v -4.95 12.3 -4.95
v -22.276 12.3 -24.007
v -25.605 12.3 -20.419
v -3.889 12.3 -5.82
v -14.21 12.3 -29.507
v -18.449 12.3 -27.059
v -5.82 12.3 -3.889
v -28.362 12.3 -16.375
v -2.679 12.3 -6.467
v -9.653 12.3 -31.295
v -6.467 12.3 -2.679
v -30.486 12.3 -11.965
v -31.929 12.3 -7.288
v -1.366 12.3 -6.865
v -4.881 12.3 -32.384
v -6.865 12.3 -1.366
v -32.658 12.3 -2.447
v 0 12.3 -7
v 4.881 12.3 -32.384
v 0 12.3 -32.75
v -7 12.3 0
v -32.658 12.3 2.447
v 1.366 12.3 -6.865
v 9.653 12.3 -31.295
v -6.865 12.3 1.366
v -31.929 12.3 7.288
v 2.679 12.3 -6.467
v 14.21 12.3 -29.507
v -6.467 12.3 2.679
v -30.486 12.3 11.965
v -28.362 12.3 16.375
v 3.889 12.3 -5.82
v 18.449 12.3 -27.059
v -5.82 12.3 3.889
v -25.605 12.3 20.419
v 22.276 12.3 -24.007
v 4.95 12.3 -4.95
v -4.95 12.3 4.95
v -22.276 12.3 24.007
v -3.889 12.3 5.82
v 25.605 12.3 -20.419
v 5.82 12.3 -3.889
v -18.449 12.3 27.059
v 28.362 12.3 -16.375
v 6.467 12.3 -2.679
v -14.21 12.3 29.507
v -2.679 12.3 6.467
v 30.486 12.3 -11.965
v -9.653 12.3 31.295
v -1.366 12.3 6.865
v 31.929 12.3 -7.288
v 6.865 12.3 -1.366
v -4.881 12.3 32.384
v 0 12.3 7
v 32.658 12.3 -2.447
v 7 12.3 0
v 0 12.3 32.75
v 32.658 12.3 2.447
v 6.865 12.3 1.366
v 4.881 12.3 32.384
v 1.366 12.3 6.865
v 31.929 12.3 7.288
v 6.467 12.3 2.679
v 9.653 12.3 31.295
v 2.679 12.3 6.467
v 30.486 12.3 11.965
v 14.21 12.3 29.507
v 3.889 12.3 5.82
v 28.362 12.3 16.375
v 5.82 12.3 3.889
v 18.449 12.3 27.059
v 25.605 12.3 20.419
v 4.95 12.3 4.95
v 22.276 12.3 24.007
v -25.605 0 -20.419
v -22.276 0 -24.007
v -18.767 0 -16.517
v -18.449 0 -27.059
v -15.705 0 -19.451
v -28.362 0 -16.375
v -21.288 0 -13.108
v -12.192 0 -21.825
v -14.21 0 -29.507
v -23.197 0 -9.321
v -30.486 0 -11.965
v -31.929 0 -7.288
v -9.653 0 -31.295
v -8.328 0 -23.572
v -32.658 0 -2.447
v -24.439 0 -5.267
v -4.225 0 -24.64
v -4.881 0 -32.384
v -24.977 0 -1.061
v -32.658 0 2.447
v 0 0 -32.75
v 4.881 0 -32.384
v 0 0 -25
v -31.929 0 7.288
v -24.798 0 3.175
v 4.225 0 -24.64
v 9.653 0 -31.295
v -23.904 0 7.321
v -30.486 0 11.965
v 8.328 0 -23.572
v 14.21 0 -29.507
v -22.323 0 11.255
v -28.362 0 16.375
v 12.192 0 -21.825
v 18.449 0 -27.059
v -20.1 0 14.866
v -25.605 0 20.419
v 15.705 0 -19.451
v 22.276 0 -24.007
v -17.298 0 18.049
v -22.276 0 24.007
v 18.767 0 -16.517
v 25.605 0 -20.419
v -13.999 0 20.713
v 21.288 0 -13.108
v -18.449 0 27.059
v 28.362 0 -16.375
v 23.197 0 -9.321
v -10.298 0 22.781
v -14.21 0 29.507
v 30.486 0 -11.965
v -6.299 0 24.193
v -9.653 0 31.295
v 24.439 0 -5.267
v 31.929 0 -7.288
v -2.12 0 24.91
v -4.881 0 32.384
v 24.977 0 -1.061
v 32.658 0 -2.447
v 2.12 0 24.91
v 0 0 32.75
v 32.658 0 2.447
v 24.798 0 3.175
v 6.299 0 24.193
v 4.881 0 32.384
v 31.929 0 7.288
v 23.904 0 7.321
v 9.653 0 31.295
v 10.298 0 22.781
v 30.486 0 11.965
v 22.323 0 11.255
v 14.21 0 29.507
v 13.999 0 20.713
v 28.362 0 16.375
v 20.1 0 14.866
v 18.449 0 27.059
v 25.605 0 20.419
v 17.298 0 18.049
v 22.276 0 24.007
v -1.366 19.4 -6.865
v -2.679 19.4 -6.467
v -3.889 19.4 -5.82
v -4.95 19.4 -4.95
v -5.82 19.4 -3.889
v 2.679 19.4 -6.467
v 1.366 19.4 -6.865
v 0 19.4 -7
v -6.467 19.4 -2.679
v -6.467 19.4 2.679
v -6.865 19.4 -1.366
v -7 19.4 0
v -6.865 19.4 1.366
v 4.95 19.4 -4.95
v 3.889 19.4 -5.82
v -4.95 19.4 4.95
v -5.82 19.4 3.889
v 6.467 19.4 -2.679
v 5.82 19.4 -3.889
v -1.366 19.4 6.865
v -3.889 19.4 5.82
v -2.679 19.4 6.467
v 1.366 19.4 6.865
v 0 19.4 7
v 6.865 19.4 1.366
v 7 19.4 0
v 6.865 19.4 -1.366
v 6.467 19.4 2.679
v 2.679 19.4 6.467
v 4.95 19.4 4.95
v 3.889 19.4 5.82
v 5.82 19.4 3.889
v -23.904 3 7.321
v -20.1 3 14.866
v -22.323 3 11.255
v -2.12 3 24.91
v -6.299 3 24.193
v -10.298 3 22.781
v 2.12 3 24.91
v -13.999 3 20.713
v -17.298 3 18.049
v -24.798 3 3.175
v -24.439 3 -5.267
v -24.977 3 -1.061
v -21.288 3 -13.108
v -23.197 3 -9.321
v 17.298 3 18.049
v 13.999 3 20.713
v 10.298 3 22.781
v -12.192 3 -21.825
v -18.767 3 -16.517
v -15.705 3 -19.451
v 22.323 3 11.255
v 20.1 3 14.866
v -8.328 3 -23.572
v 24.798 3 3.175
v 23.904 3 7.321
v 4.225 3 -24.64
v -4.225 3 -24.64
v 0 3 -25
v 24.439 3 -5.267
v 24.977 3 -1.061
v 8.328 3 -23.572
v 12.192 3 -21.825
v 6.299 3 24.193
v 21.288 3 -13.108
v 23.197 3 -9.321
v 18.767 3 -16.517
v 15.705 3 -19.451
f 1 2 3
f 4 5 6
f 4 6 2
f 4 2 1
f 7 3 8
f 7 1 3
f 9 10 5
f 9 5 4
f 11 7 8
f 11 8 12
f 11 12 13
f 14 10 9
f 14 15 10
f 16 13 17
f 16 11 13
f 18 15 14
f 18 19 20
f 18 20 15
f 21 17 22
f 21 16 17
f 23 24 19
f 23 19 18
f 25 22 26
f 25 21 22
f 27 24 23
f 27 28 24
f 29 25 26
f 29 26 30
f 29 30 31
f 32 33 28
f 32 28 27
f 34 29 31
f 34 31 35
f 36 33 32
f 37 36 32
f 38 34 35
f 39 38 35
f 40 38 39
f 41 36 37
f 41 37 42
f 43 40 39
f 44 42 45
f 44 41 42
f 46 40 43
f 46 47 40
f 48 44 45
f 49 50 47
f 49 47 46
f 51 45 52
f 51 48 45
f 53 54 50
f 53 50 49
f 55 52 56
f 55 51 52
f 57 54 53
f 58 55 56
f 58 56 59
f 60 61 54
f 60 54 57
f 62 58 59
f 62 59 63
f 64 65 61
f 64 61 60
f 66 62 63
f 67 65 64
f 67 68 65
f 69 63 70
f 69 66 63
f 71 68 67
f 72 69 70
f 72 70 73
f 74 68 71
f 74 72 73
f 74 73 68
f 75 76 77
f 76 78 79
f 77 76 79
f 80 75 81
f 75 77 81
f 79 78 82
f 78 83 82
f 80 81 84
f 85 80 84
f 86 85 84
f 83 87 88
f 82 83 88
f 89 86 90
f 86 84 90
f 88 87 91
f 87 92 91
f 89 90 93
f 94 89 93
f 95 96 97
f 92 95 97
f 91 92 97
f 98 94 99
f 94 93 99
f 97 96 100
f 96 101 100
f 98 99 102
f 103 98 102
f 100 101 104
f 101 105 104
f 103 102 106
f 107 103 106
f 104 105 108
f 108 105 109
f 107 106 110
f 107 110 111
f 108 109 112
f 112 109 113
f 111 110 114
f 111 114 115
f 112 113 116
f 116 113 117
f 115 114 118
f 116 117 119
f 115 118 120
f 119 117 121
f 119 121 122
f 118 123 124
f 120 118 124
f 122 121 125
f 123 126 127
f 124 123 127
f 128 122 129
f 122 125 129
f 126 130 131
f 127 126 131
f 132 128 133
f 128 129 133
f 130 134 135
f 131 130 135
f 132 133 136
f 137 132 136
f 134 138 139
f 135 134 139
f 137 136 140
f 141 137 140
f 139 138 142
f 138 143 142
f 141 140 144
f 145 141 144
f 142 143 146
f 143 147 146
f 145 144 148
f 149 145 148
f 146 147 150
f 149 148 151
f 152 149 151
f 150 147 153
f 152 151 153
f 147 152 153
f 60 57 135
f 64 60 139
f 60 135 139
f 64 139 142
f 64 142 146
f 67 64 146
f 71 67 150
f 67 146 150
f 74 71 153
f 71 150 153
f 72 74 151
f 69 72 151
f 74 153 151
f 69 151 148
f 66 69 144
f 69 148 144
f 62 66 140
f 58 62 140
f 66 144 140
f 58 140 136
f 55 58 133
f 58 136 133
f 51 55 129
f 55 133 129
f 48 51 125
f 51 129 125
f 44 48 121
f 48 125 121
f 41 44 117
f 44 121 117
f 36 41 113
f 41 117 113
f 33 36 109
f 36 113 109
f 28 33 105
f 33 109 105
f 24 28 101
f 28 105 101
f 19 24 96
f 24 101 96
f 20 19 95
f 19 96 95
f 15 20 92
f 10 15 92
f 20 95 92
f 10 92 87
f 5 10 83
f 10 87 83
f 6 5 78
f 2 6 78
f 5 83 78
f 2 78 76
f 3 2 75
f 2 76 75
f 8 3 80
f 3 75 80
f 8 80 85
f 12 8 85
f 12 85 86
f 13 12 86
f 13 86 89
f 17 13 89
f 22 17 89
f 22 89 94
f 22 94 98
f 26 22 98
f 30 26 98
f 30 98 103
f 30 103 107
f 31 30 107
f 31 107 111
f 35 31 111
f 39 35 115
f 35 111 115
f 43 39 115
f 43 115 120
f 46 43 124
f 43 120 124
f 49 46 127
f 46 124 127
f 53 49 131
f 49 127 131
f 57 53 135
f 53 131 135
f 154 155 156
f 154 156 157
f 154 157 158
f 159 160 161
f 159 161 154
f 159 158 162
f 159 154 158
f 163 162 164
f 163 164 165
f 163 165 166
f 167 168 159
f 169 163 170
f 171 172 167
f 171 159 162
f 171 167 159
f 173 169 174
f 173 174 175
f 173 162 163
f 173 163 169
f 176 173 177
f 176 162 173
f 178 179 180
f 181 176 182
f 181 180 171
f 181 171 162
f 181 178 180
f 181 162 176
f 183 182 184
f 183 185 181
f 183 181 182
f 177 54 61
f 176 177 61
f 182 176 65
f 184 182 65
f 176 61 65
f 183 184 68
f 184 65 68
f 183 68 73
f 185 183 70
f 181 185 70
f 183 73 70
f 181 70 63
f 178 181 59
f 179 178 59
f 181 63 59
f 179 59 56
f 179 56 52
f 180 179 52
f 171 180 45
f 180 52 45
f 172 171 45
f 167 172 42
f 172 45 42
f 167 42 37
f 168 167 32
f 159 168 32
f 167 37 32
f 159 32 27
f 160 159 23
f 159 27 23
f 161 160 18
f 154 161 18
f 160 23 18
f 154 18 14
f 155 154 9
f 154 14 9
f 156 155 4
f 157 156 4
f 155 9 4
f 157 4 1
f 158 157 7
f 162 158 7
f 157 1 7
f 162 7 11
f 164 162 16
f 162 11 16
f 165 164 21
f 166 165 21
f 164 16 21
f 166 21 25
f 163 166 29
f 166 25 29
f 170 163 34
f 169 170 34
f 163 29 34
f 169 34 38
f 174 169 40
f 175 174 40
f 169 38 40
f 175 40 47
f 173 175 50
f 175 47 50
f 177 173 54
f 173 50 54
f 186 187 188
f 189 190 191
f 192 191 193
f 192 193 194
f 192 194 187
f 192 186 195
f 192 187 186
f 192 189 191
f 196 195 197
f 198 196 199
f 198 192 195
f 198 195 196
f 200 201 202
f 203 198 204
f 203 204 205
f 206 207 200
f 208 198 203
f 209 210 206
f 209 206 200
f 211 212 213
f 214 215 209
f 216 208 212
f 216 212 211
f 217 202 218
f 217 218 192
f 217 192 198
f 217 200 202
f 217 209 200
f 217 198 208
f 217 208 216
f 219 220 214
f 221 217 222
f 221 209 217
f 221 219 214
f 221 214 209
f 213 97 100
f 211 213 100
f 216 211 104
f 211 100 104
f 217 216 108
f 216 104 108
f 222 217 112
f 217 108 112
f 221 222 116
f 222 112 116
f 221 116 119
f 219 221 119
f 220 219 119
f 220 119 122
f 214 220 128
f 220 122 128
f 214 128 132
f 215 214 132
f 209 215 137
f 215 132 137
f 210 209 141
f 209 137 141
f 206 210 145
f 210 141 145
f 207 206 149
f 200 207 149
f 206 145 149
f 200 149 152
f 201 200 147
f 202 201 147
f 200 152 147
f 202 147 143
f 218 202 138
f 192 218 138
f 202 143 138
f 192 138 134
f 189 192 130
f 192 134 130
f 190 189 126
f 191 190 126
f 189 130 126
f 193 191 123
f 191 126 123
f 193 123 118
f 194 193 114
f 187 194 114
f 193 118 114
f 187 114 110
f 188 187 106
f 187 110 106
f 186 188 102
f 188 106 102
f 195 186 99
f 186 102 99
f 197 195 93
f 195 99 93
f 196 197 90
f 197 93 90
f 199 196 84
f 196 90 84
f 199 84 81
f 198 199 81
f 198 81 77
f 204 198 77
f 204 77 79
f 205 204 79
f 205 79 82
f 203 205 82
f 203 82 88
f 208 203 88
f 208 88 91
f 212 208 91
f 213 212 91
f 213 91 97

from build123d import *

# Parameters (mm, degrees)
SKETCH1_R           = 32.75
BOSS_EXTRUDE1_DEPTH = 12.3
SKETCH2_R           = 7
BOSS_EXTRUDE2_DEPTH = 7.1
SKETCH4_R           = 25
CUT_EXTRUDE1_DEPTH  = 3


with BuildPart() as part:
    # Sketch1 → Boss-Extrude1 (new body)
    with BuildSketch(Plane(origin=(0, 0, 0), x_dir=(1, 0, 0), z_dir=(0, 1, 0))):
        with Locations(Location((0, 0, 0), (0, 0, 270))):
            Circle(SKETCH1_R)
    extrude(amount=BOSS_EXTRUDE1_DEPTH)

    # Sketch2 → Boss-Extrude2 (add)
    with BuildSketch(Plane(origin=(0, 12.3, 0), x_dir=(1, 0, 0), z_dir=(0, 1, 0))):
        with Locations(Location((0, 0, 0), (0, 0, 270))):
            Circle(SKETCH2_R)
    extrude(amount=BOSS_EXTRUDE2_DEPTH)

    # Sketch4 → Cut-Extrude1 (cut)
    with BuildSketch(Plane.XZ):
        with Locations(Location((0, 0, 0), (0, 0, 270))):
            Circle(SKETCH4_R)
    extrude(amount=-CUT_EXTRUDE1_DEPTH, mode=Mode.SUBTRACT)


solid = part.part
